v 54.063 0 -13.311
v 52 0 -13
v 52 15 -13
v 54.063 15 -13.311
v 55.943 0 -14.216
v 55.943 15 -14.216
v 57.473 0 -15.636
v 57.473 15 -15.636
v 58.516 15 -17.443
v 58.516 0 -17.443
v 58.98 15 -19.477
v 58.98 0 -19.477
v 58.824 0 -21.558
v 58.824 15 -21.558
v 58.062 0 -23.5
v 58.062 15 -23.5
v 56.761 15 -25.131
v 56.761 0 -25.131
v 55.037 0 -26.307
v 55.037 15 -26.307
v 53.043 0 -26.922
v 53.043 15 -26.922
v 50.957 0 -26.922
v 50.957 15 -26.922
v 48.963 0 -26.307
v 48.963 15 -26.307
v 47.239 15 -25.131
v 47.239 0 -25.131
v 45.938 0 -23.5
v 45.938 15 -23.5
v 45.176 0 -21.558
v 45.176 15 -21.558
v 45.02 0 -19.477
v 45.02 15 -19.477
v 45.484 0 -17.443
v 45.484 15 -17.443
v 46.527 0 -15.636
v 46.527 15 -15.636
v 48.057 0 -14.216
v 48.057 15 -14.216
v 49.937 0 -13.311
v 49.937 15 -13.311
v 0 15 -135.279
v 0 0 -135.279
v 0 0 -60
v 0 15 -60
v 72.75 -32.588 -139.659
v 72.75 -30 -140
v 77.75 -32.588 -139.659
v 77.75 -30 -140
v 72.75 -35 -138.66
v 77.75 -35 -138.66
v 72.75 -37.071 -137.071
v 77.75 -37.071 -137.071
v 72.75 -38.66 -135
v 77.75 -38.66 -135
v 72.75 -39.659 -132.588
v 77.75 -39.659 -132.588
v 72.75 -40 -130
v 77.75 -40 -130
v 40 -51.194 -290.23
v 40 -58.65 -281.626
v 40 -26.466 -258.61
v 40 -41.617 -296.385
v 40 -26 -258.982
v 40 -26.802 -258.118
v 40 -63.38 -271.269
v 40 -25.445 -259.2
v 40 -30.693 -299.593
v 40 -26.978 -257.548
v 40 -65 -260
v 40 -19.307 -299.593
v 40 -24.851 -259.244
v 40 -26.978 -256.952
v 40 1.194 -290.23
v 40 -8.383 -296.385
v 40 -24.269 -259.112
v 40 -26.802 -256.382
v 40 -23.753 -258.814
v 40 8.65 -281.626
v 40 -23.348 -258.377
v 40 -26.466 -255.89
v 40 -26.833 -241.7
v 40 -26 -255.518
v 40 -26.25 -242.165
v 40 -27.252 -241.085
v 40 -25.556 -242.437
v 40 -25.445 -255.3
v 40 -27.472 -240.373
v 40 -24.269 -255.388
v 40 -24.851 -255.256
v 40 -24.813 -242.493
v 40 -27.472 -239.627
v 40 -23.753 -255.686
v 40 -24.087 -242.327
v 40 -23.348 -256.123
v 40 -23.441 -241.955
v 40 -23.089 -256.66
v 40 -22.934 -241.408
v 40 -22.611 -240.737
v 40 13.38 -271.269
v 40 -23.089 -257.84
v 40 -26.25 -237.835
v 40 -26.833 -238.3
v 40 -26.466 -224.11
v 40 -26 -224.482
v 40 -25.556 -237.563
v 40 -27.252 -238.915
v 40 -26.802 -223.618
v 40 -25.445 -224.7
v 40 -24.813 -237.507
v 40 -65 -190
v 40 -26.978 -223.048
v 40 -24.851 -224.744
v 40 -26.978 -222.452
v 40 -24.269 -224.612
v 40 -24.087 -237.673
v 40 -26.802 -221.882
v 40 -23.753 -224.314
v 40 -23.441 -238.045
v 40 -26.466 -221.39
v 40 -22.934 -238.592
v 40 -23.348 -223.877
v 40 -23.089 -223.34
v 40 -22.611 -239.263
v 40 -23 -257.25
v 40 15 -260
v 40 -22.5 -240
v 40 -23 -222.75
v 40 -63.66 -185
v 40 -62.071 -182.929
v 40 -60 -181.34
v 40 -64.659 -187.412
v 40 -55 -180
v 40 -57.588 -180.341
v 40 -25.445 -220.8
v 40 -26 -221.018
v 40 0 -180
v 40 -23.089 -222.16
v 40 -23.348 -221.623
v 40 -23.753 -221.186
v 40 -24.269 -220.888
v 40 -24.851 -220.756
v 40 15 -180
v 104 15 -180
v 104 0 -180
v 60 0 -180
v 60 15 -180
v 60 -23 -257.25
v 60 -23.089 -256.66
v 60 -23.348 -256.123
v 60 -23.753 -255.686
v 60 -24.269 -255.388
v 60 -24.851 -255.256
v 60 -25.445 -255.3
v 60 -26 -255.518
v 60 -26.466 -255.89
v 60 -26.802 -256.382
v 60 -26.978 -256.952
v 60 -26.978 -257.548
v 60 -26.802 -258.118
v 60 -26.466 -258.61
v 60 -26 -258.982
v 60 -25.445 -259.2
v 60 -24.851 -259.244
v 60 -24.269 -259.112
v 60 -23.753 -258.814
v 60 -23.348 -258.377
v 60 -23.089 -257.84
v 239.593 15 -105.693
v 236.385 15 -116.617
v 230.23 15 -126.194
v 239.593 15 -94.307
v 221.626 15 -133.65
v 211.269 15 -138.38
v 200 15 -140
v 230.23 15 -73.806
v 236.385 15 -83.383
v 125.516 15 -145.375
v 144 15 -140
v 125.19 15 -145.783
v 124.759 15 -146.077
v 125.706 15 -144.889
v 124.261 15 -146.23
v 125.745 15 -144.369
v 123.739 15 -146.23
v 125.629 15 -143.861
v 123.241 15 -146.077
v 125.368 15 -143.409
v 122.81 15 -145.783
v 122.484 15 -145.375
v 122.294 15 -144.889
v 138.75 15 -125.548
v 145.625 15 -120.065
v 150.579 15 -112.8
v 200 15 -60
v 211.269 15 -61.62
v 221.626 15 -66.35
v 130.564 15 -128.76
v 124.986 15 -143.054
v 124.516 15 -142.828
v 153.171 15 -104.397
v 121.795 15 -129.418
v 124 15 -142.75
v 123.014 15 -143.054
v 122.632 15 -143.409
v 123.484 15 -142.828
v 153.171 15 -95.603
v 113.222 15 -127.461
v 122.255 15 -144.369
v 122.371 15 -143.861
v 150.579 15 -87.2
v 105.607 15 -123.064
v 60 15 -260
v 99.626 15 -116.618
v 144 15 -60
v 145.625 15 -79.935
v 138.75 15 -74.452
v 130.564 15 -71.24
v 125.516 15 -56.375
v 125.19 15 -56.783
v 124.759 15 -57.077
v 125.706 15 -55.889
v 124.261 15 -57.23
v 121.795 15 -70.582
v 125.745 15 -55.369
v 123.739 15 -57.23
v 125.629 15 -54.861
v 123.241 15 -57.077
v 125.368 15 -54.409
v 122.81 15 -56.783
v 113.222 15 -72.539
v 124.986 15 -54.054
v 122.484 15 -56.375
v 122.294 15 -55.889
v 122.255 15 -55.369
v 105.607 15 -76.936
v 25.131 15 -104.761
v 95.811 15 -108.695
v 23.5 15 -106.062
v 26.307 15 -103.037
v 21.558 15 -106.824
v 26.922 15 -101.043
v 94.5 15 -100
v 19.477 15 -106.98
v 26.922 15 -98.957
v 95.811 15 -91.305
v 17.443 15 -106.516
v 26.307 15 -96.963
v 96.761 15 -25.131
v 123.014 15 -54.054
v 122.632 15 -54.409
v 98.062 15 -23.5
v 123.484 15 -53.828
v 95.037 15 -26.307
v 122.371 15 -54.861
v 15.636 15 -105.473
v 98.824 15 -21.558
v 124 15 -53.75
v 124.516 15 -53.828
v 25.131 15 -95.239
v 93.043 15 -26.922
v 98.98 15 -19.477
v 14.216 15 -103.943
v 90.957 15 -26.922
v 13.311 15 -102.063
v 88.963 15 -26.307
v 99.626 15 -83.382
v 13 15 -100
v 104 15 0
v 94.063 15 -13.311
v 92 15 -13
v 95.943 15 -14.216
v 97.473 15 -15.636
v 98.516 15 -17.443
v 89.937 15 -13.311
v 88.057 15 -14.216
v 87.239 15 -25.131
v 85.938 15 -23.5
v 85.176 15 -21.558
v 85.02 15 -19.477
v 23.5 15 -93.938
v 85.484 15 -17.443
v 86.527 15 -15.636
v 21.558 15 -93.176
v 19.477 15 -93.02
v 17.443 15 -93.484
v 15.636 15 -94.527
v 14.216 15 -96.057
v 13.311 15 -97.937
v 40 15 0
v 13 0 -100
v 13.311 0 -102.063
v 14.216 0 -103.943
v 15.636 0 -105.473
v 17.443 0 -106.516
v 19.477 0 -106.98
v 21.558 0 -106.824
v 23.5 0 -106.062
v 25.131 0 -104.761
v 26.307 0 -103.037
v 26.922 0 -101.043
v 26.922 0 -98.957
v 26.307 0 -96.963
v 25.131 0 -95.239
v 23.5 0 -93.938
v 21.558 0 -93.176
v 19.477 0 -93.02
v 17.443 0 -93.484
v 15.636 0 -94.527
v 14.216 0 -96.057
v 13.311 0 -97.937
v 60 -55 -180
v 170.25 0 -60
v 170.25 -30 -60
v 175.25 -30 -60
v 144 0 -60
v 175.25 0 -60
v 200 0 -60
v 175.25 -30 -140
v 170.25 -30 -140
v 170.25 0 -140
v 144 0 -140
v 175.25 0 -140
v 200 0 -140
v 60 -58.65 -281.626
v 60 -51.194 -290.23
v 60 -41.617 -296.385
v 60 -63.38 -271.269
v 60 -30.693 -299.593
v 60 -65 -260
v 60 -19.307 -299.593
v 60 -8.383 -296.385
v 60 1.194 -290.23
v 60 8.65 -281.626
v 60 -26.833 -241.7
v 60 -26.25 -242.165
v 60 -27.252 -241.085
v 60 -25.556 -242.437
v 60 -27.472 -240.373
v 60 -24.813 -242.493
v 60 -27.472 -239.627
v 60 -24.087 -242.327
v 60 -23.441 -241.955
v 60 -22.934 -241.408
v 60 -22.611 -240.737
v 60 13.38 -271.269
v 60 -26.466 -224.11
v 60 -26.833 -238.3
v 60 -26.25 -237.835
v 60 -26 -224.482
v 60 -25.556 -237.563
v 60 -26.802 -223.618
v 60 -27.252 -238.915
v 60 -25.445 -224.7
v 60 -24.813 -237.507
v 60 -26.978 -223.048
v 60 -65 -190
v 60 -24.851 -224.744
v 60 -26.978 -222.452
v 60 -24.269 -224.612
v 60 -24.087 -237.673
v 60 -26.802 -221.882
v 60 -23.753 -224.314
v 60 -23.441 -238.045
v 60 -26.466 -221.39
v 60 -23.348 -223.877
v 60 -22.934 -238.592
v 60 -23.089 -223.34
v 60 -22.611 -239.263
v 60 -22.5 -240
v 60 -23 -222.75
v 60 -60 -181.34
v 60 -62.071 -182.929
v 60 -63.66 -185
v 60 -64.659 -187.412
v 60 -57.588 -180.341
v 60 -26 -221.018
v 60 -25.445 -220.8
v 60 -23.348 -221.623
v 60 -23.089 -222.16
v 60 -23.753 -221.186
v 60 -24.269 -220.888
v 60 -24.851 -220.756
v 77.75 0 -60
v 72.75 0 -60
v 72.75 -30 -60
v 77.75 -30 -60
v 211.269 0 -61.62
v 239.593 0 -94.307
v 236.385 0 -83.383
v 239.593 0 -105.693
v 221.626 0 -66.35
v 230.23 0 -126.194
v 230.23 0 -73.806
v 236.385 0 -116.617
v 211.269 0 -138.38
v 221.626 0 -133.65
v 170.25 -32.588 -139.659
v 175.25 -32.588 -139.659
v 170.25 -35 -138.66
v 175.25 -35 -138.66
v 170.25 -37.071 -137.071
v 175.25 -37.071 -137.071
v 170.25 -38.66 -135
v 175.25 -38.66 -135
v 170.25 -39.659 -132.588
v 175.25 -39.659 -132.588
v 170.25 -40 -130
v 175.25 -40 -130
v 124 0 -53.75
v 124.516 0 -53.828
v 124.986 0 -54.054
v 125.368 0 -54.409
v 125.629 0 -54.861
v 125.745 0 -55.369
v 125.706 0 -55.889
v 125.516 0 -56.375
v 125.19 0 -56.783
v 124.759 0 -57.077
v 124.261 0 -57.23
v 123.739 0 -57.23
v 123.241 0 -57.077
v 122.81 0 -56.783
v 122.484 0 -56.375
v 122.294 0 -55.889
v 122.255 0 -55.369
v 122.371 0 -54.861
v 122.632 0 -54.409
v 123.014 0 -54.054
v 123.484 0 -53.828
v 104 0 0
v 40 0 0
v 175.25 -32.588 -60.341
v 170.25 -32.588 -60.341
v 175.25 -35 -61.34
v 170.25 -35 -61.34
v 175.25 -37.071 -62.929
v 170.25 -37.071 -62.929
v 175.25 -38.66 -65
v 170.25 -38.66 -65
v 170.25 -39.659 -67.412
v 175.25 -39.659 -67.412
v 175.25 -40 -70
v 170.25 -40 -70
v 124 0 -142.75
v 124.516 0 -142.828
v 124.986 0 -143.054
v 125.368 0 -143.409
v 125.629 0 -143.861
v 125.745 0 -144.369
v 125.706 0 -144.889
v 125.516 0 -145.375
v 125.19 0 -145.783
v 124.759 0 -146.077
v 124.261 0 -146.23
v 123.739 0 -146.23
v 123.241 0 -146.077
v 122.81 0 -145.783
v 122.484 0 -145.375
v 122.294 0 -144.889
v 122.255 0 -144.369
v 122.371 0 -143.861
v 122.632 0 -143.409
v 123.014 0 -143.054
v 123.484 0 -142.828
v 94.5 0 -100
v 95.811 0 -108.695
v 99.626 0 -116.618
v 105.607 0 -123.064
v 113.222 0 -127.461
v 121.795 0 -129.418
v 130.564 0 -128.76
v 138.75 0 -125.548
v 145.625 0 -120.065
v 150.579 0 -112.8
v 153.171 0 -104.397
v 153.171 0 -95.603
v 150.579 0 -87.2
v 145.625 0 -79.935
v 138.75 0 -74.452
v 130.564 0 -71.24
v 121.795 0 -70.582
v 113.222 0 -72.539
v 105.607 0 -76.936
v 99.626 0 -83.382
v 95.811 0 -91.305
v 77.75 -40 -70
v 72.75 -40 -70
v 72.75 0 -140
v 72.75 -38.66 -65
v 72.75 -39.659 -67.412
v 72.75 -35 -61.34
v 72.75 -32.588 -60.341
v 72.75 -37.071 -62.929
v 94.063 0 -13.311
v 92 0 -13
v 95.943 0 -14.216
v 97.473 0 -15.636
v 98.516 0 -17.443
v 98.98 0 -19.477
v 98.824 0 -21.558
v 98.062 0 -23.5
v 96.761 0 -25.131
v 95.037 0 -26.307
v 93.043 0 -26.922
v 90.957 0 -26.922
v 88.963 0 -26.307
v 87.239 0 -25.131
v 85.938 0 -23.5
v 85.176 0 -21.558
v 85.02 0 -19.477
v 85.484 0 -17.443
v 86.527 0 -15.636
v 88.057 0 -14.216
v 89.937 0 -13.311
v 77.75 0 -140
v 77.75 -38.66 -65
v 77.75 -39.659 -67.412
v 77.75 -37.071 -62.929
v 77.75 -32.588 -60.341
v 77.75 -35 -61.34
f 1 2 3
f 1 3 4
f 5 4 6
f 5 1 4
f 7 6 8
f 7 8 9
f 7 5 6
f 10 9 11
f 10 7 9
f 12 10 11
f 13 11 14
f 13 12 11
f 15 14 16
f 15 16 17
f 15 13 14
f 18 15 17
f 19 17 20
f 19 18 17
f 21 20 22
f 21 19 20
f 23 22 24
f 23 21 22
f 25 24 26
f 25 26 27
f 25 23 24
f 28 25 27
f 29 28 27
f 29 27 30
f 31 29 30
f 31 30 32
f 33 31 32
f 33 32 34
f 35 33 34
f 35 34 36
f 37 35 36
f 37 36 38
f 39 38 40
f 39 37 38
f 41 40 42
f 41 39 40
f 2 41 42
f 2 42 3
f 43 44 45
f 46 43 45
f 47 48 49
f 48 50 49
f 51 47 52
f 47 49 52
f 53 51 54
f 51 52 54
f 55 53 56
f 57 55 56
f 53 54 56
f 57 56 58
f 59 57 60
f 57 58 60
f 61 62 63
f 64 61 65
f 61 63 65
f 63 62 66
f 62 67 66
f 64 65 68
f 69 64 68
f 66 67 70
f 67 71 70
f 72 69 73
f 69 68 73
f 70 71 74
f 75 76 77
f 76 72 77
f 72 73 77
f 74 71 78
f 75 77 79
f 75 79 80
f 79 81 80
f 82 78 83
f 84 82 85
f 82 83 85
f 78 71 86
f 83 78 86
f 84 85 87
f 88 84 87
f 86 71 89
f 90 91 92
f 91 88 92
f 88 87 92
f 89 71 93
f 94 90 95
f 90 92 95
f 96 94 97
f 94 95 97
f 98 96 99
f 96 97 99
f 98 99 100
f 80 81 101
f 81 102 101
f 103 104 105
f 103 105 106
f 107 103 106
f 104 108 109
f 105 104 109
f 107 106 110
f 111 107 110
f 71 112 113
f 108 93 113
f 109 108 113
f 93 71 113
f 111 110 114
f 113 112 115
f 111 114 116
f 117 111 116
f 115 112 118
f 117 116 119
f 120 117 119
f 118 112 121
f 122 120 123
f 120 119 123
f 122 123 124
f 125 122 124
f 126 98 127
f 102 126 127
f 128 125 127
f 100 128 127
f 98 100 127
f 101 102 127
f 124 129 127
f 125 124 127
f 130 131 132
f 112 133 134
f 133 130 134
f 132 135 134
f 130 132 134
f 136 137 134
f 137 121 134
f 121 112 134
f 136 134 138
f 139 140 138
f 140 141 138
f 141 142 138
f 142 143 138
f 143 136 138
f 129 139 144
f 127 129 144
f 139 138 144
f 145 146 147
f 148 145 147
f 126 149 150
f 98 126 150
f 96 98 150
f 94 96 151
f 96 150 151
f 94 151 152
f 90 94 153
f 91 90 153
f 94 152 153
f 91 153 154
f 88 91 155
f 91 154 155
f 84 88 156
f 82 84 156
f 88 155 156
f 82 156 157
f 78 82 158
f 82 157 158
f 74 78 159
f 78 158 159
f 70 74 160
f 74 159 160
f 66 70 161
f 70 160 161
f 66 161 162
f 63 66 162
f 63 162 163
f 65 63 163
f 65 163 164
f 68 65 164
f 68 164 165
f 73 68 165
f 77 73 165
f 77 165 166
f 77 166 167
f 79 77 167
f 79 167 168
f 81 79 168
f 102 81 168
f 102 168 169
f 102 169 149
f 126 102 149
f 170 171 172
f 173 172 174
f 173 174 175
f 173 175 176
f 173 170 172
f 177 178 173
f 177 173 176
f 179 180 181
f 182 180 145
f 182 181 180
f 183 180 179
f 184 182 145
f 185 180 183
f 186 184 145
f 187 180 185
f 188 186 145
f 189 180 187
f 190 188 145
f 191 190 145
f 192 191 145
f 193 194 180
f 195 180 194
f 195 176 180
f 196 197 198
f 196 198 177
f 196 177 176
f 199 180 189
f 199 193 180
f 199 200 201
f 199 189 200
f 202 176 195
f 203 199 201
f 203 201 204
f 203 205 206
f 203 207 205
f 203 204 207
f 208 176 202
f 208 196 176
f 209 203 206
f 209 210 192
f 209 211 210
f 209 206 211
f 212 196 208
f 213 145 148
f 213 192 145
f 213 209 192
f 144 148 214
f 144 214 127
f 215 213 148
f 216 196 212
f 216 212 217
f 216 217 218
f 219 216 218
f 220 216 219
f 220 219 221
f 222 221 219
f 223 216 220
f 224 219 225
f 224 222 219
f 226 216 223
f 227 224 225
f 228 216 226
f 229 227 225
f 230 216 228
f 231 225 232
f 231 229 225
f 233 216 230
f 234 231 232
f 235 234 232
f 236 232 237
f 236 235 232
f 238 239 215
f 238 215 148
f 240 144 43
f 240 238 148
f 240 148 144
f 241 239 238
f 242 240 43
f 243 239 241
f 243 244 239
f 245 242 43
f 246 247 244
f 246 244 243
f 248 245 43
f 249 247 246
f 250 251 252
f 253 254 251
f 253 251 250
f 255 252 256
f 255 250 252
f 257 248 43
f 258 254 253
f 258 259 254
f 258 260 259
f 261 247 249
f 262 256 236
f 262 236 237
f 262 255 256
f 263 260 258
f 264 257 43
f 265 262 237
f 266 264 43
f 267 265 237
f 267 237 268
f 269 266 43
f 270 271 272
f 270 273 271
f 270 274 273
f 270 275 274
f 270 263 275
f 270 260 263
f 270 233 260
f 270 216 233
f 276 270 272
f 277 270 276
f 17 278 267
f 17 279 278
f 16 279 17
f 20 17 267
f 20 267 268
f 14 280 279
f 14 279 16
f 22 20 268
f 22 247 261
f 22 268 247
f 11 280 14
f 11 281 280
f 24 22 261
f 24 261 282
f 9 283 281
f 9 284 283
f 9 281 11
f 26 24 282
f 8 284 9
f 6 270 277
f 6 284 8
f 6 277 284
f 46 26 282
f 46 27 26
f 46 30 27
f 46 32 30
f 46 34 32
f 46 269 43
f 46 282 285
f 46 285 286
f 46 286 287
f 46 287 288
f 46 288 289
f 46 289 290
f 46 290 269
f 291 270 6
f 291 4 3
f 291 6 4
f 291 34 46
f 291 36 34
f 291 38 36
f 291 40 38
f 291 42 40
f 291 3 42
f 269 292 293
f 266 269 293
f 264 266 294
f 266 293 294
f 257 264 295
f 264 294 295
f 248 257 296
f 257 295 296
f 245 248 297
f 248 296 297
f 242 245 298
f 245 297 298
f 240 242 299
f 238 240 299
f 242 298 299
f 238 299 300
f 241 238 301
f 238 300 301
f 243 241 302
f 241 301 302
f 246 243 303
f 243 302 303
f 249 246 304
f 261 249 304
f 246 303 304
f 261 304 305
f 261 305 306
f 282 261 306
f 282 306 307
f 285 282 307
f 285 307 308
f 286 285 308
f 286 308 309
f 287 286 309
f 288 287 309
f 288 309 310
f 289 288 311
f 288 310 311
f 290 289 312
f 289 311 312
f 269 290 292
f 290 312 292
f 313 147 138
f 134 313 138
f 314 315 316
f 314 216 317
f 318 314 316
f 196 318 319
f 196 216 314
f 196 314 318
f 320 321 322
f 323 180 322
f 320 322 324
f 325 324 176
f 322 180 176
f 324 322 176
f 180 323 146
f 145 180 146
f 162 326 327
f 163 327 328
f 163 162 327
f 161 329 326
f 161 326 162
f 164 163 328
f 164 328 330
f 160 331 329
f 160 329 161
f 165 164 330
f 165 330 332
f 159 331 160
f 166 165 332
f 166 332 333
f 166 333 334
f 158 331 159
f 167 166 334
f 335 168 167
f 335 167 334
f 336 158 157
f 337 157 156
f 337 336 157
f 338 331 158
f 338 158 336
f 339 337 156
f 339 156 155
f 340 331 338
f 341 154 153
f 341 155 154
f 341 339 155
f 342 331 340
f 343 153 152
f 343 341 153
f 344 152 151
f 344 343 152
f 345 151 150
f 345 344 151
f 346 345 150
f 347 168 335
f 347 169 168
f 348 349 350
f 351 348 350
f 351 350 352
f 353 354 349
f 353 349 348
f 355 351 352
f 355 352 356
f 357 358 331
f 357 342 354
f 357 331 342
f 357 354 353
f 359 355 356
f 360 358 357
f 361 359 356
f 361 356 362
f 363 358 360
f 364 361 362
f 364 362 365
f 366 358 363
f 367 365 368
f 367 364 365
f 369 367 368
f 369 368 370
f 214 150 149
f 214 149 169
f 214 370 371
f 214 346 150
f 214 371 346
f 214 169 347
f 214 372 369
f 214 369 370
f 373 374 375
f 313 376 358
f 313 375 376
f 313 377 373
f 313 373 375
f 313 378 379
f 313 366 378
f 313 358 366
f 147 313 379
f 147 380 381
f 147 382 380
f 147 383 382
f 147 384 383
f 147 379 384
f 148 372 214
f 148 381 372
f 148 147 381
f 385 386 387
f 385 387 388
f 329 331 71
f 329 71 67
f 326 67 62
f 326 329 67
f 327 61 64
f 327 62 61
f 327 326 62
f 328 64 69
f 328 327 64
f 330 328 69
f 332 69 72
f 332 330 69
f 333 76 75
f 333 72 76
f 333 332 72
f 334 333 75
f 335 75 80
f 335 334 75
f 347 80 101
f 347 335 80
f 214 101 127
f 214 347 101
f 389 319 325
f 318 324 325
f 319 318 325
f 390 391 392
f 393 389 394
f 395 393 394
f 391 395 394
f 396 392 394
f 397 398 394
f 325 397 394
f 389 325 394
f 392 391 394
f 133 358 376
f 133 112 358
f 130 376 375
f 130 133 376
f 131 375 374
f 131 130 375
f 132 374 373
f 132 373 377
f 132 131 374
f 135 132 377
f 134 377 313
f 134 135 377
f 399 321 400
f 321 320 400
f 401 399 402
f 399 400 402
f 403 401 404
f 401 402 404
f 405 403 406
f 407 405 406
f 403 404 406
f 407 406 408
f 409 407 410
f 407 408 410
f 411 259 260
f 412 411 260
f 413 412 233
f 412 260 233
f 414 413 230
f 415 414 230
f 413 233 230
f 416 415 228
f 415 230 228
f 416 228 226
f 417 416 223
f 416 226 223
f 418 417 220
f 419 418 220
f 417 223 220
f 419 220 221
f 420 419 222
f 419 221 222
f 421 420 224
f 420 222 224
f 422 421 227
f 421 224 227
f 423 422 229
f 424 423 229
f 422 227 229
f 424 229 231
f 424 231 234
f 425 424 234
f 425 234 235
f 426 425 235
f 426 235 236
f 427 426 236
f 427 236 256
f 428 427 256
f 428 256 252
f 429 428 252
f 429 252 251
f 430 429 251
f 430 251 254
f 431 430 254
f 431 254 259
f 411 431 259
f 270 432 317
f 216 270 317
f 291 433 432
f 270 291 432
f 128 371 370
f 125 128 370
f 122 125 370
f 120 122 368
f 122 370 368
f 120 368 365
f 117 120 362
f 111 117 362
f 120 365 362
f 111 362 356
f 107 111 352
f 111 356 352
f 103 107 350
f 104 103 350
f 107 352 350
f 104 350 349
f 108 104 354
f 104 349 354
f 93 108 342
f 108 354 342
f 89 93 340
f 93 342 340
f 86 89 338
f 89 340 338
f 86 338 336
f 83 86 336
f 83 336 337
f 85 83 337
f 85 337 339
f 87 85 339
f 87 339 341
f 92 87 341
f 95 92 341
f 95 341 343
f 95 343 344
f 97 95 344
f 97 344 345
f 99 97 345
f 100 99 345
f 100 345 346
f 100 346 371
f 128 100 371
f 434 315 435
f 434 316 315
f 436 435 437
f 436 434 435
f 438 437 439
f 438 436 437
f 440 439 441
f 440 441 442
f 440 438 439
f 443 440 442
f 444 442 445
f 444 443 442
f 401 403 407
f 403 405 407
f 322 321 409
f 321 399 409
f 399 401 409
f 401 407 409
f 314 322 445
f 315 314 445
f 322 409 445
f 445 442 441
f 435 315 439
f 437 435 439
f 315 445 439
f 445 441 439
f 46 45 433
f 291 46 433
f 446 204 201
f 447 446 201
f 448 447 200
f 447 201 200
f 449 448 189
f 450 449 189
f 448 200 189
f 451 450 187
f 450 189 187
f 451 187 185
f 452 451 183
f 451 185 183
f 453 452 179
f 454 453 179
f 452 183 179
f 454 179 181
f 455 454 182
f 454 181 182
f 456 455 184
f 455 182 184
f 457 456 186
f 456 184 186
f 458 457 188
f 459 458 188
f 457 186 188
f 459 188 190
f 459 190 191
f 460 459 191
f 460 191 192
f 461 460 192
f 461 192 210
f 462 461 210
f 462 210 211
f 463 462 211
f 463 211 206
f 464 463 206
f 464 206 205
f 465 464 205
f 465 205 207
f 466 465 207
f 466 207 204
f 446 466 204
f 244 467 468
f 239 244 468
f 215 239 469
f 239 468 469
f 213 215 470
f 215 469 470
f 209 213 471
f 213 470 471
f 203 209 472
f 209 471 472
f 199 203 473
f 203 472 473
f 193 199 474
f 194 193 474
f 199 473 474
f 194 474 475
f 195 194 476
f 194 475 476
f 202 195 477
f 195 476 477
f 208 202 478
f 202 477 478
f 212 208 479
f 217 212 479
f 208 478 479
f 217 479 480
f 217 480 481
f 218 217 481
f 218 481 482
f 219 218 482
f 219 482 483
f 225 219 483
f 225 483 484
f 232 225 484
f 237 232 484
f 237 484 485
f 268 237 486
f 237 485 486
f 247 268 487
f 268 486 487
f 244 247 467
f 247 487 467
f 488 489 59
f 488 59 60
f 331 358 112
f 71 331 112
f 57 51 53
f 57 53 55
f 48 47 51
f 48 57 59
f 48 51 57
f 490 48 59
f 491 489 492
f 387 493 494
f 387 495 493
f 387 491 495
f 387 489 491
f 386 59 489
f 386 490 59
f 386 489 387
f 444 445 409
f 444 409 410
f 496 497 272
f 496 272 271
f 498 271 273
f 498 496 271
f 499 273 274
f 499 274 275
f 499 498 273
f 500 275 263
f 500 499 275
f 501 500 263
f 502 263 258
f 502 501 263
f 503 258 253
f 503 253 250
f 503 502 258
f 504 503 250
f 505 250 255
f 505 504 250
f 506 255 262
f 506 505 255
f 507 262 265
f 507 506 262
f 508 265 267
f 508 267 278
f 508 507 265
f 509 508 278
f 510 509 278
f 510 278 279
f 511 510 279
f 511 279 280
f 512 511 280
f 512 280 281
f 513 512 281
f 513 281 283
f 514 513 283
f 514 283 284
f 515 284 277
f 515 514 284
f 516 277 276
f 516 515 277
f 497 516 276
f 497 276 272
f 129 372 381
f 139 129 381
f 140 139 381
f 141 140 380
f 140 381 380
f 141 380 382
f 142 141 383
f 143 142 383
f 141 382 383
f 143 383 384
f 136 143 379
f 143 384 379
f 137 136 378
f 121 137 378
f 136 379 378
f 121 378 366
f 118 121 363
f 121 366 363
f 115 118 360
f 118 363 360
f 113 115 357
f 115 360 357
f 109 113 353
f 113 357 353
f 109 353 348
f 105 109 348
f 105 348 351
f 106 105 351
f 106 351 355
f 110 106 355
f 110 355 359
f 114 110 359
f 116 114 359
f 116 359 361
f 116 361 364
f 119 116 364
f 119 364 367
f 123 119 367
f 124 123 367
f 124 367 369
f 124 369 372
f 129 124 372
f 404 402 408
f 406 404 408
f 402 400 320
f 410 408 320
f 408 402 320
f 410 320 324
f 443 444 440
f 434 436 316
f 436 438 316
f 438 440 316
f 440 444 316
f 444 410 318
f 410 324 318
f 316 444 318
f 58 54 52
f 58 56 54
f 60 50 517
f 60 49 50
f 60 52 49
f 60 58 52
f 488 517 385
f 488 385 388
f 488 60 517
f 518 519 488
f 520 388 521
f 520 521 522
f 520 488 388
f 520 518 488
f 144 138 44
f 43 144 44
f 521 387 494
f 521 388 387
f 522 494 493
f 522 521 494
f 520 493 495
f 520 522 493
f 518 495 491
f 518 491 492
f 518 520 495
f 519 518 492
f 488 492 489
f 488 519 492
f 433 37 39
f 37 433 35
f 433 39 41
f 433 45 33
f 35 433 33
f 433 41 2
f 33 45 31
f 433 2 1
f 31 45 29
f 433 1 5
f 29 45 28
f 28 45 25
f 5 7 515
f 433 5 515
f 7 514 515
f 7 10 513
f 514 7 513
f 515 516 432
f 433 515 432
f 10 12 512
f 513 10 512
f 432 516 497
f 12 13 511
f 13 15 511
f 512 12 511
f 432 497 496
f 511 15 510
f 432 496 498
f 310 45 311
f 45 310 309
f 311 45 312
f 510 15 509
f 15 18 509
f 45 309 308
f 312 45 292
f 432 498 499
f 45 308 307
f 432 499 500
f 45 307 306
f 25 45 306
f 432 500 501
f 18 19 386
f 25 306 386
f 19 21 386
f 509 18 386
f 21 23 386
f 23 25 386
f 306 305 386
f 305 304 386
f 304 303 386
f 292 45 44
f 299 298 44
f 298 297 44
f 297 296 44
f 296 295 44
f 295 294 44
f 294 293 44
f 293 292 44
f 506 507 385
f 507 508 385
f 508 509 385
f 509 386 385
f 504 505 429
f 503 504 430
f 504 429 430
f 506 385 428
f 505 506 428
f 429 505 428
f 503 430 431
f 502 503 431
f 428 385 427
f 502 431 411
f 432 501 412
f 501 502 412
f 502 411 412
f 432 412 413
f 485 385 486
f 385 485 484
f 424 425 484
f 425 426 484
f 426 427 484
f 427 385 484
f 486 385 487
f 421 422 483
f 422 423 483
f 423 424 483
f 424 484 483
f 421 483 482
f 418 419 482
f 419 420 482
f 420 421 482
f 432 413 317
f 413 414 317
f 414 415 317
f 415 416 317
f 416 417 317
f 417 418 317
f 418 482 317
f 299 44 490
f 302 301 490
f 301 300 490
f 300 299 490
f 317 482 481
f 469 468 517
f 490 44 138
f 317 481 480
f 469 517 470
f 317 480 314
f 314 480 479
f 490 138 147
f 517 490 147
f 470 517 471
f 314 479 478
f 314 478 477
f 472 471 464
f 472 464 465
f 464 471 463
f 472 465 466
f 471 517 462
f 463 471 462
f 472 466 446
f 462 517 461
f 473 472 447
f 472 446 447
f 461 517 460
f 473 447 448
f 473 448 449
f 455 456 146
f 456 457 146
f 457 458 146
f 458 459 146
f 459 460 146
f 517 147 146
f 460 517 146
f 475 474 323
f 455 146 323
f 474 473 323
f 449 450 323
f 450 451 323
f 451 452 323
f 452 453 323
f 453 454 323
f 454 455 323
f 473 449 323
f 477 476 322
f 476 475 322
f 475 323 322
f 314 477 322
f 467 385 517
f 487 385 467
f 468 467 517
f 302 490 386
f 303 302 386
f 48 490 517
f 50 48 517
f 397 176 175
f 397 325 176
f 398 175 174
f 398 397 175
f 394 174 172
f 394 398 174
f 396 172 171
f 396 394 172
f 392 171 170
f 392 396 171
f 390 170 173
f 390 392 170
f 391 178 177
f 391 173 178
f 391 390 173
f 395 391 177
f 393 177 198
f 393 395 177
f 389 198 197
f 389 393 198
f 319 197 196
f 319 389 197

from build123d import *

# Parameters (mm, degrees)
SKETCH_1_R          = 7
EXTRUDE_1_DEPTH     = 15
SKETCH_2_W          = 20
SKETCH_2_H          = 80
EXTRUDE_3_DEPTH     = 120
SKETCH_3_R          = 2.5
SKETCH_3_R_2        = 2
CUT_EXTRUDE_1_DEPTH = 120
SKETCH_4_W          = 102.5
SKETCH_4_H          = 80
EXTRUDE_4_DEPTH     = 40
SKETCH_5_W          = 92.5
SKETCH_5_H          = 80
CUT_EXTRUDE_2_DEPTH = 40
FILLET_1_R          = 10
FILLET_2_RADIUS     = 40
FILLET_2_LENGTH     = 20
FILLET_3_R          = 10
SKETCH_6_R          = 1.75
CUT_EXTRUDE_4_DEPTH = 40
FILLET_5_RADIUS     = 40
FILLET_5_LENGTH     = 15


with BuildPart() as part:
    # 草图1 → 凸台-拉伸1 (new body)
    # profile 1 of 2: a face of its own
    with BuildSketch(Plane(origin=(0, 0, 0), x_dir=(1, 0, 0), z_dir=(0, 1, 0))):
        with BuildLine():
            Line((13, 100), (0, 100))
            Line((0, 100), (0, 60))
            Line((0, 60), (40, 0))
            Line((40, 0), (104, 0))
            Line((104, 0), (144, 60))
            Line((144, 60), (240, 60))
            Line((240, 60), (240, 100))
            Line((240, 100), (153.5, 100))
            ThreePointArc((153.5, 100), (124, 70.5), (94.5, 100))
            Line((94.5, 100), (27, 100))
            ThreePointArc((27, 100), (20, 93), (13, 100))
        make_face()
        with Locations(Location((52, 20, 0), (0, 0, 270))):
            Circle(SKETCH_1_R, mode=Mode.SUBTRACT)
        with Locations(Location((92, 20, 0), (0, 0, 270))):
            Circle(SKETCH_1_R, mode=Mode.SUBTRACT)
    # profile 2 of 2: a face of its own
    with BuildSketch(Plane(origin=(0, 0, 0), x_dir=(1, 0, 0), z_dir=(0, 1, 0))):
        with BuildLine():
            Line((104, 180), (40, 180))
            Line((40, 180), (0, 135.27864045))
            Line((0, 135.27864045), (0, 100))
            Line((0, 100), (13, 100))
            ThreePointArc((13, 100), (20, 107), (27, 100))
            Line((27, 100), (94.5, 100))
            ThreePointArc((94.5, 100), (124, 129.5), (153.5, 100))
            Line((153.5, 100), (240, 100))
            Line((240, 100), (240, 140))
            Line((240, 140), (144, 140))
            Line((144, 140), (104, 180))
        make_face()
    extrude(amount=EXTRUDE_1_DEPTH)

    # 草图2 → 凸台-拉伸3 (add)
    with BuildSketch(Plane(origin=(0, 0, -180), x_dir=(-1, 0, 0), z_dir=(0, 0, -1))):
        with Locations((-50, -25)):
            Rectangle(SKETCH_2_W, SKETCH_2_H)
    extrude(amount=EXTRUDE_3_DEPTH)

    # 草图3 → 切除-拉伸1 (cut)
    with BuildSketch(Plane(origin=(60, 0, 0), x_dir=(0, 0, -1), z_dir=(1, 0, 0))):
        with Locations(Location((240, -25, 0), (0, 0, 90))):
            Circle(SKETCH_3_R)
        with Locations(Location((257.25, -25, 0), (0, 0, 90))):
            Circle(SKETCH_3_R_2)
        with Locations(Location((222.75, -25, 0), (0, 0, 90))):
            Circle(SKETCH_3_R_2)
    extrude(amount=-CUT_EXTRUDE_1_DEPTH, mode=Mode.SUBTRACT)

    # 草图4 → 凸台-拉伸4 (add)
    with BuildSketch(Plane.XZ):
        with Locations((124, -100)):
            Rectangle(SKETCH_4_W, SKETCH_4_H)
    extrude(amount=EXTRUDE_4_DEPTH)

    # 草图5 → 切除-拉伸2 (cut)
    with BuildSketch(Plane.XZ.offset(40)):
        with Locations((124, -100)):
            Rectangle(SKETCH_5_W, SKETCH_5_H)
    extrude(amount=-CUT_EXTRUDE_2_DEPTH, mode=Mode.SUBTRACT)

    # 圆角1
    fillet_1_edges = [part.edges().sort_by_distance(p)[0] for p in [
        (172.75, -40, -140),
        (172.75, -40, -60),
        (75.25, -40, -140),
        (75.25, -40, -60),
    ]]
    fillet(fillet_1_edges, radius=FILLET_1_R)

    # 圆角2: full round fillet: the end face becomes a half cylinder, R = half its width
    fillet_2_face = Plane((50, -25, -300), x_dir=(1, 0, 0), z_dir=(0, 0, -1))  # on the end face: x along it, z out of the body
    fillet_2_slab = fillet_2_face.offset(-FILLET_2_RADIUS / 2) * Box(FILLET_2_LENGTH, 2 * FILLET_2_RADIUS, FILLET_2_RADIUS, mode=Mode.PRIVATE)  # the body's end, R deep
    fillet_2_round = Plane((50, -25, -260), x_dir=(0, 0, -1), z_dir=(1, 0, 0)) * Cylinder(FILLET_2_RADIUS, FILLET_2_LENGTH, mode=Mode.PRIVATE)  # its axis R under the face
    add(fillet_2_slab - fillet_2_round, mode=Mode.SUBTRACT)

    # 圆角3
    fillet_3_edges = [part.edges().sort_by_distance(p)[0] for p in [
        (50, -65, -180),
    ]]
    fillet(fillet_3_edges, radius=FILLET_3_R)

    # 草图6 → 切除-拉伸4 (cut)
    with BuildSketch(Plane(origin=(0, 15, 0), x_dir=(1, 0, 0), z_dir=(0, 1, 0))):
        with Locations(Location((124, 144.5, 0), (0, 0, 270))):
            Circle(SKETCH_6_R)
        with Locations(Location((124, 55.5, 0), (0, 0, 270))):
            Circle(SKETCH_6_R)
    extrude(amount=-CUT_EXTRUDE_4_DEPTH, mode=Mode.SUBTRACT)

    # 圆角5: full round fillet: the end face becomes a half cylinder, R = half its width
    fillet_5_face = Plane((240, 7.5, -100), x_dir=(0, -1, 0), z_dir=(1, 0, 0))  # on the end face: x along it, z out of the body
    fillet_5_slab = fillet_5_face.offset(-FILLET_5_RADIUS / 2) * Box(FILLET_5_LENGTH, 2 * FILLET_5_RADIUS, FILLET_5_RADIUS, mode=Mode.PRIVATE)  # the body's end, R deep
    fillet_5_round = Plane((200, 7.5, -100), x_dir=(1, 0, 0), z_dir=(0, -1, 0)) * Cylinder(FILLET_5_RADIUS, FILLET_5_LENGTH, mode=Mode.PRIVATE)  # its axis R under the face
    add(fillet_5_slab - fillet_5_round, mode=Mode.SUBTRACT)


solid = part.part
